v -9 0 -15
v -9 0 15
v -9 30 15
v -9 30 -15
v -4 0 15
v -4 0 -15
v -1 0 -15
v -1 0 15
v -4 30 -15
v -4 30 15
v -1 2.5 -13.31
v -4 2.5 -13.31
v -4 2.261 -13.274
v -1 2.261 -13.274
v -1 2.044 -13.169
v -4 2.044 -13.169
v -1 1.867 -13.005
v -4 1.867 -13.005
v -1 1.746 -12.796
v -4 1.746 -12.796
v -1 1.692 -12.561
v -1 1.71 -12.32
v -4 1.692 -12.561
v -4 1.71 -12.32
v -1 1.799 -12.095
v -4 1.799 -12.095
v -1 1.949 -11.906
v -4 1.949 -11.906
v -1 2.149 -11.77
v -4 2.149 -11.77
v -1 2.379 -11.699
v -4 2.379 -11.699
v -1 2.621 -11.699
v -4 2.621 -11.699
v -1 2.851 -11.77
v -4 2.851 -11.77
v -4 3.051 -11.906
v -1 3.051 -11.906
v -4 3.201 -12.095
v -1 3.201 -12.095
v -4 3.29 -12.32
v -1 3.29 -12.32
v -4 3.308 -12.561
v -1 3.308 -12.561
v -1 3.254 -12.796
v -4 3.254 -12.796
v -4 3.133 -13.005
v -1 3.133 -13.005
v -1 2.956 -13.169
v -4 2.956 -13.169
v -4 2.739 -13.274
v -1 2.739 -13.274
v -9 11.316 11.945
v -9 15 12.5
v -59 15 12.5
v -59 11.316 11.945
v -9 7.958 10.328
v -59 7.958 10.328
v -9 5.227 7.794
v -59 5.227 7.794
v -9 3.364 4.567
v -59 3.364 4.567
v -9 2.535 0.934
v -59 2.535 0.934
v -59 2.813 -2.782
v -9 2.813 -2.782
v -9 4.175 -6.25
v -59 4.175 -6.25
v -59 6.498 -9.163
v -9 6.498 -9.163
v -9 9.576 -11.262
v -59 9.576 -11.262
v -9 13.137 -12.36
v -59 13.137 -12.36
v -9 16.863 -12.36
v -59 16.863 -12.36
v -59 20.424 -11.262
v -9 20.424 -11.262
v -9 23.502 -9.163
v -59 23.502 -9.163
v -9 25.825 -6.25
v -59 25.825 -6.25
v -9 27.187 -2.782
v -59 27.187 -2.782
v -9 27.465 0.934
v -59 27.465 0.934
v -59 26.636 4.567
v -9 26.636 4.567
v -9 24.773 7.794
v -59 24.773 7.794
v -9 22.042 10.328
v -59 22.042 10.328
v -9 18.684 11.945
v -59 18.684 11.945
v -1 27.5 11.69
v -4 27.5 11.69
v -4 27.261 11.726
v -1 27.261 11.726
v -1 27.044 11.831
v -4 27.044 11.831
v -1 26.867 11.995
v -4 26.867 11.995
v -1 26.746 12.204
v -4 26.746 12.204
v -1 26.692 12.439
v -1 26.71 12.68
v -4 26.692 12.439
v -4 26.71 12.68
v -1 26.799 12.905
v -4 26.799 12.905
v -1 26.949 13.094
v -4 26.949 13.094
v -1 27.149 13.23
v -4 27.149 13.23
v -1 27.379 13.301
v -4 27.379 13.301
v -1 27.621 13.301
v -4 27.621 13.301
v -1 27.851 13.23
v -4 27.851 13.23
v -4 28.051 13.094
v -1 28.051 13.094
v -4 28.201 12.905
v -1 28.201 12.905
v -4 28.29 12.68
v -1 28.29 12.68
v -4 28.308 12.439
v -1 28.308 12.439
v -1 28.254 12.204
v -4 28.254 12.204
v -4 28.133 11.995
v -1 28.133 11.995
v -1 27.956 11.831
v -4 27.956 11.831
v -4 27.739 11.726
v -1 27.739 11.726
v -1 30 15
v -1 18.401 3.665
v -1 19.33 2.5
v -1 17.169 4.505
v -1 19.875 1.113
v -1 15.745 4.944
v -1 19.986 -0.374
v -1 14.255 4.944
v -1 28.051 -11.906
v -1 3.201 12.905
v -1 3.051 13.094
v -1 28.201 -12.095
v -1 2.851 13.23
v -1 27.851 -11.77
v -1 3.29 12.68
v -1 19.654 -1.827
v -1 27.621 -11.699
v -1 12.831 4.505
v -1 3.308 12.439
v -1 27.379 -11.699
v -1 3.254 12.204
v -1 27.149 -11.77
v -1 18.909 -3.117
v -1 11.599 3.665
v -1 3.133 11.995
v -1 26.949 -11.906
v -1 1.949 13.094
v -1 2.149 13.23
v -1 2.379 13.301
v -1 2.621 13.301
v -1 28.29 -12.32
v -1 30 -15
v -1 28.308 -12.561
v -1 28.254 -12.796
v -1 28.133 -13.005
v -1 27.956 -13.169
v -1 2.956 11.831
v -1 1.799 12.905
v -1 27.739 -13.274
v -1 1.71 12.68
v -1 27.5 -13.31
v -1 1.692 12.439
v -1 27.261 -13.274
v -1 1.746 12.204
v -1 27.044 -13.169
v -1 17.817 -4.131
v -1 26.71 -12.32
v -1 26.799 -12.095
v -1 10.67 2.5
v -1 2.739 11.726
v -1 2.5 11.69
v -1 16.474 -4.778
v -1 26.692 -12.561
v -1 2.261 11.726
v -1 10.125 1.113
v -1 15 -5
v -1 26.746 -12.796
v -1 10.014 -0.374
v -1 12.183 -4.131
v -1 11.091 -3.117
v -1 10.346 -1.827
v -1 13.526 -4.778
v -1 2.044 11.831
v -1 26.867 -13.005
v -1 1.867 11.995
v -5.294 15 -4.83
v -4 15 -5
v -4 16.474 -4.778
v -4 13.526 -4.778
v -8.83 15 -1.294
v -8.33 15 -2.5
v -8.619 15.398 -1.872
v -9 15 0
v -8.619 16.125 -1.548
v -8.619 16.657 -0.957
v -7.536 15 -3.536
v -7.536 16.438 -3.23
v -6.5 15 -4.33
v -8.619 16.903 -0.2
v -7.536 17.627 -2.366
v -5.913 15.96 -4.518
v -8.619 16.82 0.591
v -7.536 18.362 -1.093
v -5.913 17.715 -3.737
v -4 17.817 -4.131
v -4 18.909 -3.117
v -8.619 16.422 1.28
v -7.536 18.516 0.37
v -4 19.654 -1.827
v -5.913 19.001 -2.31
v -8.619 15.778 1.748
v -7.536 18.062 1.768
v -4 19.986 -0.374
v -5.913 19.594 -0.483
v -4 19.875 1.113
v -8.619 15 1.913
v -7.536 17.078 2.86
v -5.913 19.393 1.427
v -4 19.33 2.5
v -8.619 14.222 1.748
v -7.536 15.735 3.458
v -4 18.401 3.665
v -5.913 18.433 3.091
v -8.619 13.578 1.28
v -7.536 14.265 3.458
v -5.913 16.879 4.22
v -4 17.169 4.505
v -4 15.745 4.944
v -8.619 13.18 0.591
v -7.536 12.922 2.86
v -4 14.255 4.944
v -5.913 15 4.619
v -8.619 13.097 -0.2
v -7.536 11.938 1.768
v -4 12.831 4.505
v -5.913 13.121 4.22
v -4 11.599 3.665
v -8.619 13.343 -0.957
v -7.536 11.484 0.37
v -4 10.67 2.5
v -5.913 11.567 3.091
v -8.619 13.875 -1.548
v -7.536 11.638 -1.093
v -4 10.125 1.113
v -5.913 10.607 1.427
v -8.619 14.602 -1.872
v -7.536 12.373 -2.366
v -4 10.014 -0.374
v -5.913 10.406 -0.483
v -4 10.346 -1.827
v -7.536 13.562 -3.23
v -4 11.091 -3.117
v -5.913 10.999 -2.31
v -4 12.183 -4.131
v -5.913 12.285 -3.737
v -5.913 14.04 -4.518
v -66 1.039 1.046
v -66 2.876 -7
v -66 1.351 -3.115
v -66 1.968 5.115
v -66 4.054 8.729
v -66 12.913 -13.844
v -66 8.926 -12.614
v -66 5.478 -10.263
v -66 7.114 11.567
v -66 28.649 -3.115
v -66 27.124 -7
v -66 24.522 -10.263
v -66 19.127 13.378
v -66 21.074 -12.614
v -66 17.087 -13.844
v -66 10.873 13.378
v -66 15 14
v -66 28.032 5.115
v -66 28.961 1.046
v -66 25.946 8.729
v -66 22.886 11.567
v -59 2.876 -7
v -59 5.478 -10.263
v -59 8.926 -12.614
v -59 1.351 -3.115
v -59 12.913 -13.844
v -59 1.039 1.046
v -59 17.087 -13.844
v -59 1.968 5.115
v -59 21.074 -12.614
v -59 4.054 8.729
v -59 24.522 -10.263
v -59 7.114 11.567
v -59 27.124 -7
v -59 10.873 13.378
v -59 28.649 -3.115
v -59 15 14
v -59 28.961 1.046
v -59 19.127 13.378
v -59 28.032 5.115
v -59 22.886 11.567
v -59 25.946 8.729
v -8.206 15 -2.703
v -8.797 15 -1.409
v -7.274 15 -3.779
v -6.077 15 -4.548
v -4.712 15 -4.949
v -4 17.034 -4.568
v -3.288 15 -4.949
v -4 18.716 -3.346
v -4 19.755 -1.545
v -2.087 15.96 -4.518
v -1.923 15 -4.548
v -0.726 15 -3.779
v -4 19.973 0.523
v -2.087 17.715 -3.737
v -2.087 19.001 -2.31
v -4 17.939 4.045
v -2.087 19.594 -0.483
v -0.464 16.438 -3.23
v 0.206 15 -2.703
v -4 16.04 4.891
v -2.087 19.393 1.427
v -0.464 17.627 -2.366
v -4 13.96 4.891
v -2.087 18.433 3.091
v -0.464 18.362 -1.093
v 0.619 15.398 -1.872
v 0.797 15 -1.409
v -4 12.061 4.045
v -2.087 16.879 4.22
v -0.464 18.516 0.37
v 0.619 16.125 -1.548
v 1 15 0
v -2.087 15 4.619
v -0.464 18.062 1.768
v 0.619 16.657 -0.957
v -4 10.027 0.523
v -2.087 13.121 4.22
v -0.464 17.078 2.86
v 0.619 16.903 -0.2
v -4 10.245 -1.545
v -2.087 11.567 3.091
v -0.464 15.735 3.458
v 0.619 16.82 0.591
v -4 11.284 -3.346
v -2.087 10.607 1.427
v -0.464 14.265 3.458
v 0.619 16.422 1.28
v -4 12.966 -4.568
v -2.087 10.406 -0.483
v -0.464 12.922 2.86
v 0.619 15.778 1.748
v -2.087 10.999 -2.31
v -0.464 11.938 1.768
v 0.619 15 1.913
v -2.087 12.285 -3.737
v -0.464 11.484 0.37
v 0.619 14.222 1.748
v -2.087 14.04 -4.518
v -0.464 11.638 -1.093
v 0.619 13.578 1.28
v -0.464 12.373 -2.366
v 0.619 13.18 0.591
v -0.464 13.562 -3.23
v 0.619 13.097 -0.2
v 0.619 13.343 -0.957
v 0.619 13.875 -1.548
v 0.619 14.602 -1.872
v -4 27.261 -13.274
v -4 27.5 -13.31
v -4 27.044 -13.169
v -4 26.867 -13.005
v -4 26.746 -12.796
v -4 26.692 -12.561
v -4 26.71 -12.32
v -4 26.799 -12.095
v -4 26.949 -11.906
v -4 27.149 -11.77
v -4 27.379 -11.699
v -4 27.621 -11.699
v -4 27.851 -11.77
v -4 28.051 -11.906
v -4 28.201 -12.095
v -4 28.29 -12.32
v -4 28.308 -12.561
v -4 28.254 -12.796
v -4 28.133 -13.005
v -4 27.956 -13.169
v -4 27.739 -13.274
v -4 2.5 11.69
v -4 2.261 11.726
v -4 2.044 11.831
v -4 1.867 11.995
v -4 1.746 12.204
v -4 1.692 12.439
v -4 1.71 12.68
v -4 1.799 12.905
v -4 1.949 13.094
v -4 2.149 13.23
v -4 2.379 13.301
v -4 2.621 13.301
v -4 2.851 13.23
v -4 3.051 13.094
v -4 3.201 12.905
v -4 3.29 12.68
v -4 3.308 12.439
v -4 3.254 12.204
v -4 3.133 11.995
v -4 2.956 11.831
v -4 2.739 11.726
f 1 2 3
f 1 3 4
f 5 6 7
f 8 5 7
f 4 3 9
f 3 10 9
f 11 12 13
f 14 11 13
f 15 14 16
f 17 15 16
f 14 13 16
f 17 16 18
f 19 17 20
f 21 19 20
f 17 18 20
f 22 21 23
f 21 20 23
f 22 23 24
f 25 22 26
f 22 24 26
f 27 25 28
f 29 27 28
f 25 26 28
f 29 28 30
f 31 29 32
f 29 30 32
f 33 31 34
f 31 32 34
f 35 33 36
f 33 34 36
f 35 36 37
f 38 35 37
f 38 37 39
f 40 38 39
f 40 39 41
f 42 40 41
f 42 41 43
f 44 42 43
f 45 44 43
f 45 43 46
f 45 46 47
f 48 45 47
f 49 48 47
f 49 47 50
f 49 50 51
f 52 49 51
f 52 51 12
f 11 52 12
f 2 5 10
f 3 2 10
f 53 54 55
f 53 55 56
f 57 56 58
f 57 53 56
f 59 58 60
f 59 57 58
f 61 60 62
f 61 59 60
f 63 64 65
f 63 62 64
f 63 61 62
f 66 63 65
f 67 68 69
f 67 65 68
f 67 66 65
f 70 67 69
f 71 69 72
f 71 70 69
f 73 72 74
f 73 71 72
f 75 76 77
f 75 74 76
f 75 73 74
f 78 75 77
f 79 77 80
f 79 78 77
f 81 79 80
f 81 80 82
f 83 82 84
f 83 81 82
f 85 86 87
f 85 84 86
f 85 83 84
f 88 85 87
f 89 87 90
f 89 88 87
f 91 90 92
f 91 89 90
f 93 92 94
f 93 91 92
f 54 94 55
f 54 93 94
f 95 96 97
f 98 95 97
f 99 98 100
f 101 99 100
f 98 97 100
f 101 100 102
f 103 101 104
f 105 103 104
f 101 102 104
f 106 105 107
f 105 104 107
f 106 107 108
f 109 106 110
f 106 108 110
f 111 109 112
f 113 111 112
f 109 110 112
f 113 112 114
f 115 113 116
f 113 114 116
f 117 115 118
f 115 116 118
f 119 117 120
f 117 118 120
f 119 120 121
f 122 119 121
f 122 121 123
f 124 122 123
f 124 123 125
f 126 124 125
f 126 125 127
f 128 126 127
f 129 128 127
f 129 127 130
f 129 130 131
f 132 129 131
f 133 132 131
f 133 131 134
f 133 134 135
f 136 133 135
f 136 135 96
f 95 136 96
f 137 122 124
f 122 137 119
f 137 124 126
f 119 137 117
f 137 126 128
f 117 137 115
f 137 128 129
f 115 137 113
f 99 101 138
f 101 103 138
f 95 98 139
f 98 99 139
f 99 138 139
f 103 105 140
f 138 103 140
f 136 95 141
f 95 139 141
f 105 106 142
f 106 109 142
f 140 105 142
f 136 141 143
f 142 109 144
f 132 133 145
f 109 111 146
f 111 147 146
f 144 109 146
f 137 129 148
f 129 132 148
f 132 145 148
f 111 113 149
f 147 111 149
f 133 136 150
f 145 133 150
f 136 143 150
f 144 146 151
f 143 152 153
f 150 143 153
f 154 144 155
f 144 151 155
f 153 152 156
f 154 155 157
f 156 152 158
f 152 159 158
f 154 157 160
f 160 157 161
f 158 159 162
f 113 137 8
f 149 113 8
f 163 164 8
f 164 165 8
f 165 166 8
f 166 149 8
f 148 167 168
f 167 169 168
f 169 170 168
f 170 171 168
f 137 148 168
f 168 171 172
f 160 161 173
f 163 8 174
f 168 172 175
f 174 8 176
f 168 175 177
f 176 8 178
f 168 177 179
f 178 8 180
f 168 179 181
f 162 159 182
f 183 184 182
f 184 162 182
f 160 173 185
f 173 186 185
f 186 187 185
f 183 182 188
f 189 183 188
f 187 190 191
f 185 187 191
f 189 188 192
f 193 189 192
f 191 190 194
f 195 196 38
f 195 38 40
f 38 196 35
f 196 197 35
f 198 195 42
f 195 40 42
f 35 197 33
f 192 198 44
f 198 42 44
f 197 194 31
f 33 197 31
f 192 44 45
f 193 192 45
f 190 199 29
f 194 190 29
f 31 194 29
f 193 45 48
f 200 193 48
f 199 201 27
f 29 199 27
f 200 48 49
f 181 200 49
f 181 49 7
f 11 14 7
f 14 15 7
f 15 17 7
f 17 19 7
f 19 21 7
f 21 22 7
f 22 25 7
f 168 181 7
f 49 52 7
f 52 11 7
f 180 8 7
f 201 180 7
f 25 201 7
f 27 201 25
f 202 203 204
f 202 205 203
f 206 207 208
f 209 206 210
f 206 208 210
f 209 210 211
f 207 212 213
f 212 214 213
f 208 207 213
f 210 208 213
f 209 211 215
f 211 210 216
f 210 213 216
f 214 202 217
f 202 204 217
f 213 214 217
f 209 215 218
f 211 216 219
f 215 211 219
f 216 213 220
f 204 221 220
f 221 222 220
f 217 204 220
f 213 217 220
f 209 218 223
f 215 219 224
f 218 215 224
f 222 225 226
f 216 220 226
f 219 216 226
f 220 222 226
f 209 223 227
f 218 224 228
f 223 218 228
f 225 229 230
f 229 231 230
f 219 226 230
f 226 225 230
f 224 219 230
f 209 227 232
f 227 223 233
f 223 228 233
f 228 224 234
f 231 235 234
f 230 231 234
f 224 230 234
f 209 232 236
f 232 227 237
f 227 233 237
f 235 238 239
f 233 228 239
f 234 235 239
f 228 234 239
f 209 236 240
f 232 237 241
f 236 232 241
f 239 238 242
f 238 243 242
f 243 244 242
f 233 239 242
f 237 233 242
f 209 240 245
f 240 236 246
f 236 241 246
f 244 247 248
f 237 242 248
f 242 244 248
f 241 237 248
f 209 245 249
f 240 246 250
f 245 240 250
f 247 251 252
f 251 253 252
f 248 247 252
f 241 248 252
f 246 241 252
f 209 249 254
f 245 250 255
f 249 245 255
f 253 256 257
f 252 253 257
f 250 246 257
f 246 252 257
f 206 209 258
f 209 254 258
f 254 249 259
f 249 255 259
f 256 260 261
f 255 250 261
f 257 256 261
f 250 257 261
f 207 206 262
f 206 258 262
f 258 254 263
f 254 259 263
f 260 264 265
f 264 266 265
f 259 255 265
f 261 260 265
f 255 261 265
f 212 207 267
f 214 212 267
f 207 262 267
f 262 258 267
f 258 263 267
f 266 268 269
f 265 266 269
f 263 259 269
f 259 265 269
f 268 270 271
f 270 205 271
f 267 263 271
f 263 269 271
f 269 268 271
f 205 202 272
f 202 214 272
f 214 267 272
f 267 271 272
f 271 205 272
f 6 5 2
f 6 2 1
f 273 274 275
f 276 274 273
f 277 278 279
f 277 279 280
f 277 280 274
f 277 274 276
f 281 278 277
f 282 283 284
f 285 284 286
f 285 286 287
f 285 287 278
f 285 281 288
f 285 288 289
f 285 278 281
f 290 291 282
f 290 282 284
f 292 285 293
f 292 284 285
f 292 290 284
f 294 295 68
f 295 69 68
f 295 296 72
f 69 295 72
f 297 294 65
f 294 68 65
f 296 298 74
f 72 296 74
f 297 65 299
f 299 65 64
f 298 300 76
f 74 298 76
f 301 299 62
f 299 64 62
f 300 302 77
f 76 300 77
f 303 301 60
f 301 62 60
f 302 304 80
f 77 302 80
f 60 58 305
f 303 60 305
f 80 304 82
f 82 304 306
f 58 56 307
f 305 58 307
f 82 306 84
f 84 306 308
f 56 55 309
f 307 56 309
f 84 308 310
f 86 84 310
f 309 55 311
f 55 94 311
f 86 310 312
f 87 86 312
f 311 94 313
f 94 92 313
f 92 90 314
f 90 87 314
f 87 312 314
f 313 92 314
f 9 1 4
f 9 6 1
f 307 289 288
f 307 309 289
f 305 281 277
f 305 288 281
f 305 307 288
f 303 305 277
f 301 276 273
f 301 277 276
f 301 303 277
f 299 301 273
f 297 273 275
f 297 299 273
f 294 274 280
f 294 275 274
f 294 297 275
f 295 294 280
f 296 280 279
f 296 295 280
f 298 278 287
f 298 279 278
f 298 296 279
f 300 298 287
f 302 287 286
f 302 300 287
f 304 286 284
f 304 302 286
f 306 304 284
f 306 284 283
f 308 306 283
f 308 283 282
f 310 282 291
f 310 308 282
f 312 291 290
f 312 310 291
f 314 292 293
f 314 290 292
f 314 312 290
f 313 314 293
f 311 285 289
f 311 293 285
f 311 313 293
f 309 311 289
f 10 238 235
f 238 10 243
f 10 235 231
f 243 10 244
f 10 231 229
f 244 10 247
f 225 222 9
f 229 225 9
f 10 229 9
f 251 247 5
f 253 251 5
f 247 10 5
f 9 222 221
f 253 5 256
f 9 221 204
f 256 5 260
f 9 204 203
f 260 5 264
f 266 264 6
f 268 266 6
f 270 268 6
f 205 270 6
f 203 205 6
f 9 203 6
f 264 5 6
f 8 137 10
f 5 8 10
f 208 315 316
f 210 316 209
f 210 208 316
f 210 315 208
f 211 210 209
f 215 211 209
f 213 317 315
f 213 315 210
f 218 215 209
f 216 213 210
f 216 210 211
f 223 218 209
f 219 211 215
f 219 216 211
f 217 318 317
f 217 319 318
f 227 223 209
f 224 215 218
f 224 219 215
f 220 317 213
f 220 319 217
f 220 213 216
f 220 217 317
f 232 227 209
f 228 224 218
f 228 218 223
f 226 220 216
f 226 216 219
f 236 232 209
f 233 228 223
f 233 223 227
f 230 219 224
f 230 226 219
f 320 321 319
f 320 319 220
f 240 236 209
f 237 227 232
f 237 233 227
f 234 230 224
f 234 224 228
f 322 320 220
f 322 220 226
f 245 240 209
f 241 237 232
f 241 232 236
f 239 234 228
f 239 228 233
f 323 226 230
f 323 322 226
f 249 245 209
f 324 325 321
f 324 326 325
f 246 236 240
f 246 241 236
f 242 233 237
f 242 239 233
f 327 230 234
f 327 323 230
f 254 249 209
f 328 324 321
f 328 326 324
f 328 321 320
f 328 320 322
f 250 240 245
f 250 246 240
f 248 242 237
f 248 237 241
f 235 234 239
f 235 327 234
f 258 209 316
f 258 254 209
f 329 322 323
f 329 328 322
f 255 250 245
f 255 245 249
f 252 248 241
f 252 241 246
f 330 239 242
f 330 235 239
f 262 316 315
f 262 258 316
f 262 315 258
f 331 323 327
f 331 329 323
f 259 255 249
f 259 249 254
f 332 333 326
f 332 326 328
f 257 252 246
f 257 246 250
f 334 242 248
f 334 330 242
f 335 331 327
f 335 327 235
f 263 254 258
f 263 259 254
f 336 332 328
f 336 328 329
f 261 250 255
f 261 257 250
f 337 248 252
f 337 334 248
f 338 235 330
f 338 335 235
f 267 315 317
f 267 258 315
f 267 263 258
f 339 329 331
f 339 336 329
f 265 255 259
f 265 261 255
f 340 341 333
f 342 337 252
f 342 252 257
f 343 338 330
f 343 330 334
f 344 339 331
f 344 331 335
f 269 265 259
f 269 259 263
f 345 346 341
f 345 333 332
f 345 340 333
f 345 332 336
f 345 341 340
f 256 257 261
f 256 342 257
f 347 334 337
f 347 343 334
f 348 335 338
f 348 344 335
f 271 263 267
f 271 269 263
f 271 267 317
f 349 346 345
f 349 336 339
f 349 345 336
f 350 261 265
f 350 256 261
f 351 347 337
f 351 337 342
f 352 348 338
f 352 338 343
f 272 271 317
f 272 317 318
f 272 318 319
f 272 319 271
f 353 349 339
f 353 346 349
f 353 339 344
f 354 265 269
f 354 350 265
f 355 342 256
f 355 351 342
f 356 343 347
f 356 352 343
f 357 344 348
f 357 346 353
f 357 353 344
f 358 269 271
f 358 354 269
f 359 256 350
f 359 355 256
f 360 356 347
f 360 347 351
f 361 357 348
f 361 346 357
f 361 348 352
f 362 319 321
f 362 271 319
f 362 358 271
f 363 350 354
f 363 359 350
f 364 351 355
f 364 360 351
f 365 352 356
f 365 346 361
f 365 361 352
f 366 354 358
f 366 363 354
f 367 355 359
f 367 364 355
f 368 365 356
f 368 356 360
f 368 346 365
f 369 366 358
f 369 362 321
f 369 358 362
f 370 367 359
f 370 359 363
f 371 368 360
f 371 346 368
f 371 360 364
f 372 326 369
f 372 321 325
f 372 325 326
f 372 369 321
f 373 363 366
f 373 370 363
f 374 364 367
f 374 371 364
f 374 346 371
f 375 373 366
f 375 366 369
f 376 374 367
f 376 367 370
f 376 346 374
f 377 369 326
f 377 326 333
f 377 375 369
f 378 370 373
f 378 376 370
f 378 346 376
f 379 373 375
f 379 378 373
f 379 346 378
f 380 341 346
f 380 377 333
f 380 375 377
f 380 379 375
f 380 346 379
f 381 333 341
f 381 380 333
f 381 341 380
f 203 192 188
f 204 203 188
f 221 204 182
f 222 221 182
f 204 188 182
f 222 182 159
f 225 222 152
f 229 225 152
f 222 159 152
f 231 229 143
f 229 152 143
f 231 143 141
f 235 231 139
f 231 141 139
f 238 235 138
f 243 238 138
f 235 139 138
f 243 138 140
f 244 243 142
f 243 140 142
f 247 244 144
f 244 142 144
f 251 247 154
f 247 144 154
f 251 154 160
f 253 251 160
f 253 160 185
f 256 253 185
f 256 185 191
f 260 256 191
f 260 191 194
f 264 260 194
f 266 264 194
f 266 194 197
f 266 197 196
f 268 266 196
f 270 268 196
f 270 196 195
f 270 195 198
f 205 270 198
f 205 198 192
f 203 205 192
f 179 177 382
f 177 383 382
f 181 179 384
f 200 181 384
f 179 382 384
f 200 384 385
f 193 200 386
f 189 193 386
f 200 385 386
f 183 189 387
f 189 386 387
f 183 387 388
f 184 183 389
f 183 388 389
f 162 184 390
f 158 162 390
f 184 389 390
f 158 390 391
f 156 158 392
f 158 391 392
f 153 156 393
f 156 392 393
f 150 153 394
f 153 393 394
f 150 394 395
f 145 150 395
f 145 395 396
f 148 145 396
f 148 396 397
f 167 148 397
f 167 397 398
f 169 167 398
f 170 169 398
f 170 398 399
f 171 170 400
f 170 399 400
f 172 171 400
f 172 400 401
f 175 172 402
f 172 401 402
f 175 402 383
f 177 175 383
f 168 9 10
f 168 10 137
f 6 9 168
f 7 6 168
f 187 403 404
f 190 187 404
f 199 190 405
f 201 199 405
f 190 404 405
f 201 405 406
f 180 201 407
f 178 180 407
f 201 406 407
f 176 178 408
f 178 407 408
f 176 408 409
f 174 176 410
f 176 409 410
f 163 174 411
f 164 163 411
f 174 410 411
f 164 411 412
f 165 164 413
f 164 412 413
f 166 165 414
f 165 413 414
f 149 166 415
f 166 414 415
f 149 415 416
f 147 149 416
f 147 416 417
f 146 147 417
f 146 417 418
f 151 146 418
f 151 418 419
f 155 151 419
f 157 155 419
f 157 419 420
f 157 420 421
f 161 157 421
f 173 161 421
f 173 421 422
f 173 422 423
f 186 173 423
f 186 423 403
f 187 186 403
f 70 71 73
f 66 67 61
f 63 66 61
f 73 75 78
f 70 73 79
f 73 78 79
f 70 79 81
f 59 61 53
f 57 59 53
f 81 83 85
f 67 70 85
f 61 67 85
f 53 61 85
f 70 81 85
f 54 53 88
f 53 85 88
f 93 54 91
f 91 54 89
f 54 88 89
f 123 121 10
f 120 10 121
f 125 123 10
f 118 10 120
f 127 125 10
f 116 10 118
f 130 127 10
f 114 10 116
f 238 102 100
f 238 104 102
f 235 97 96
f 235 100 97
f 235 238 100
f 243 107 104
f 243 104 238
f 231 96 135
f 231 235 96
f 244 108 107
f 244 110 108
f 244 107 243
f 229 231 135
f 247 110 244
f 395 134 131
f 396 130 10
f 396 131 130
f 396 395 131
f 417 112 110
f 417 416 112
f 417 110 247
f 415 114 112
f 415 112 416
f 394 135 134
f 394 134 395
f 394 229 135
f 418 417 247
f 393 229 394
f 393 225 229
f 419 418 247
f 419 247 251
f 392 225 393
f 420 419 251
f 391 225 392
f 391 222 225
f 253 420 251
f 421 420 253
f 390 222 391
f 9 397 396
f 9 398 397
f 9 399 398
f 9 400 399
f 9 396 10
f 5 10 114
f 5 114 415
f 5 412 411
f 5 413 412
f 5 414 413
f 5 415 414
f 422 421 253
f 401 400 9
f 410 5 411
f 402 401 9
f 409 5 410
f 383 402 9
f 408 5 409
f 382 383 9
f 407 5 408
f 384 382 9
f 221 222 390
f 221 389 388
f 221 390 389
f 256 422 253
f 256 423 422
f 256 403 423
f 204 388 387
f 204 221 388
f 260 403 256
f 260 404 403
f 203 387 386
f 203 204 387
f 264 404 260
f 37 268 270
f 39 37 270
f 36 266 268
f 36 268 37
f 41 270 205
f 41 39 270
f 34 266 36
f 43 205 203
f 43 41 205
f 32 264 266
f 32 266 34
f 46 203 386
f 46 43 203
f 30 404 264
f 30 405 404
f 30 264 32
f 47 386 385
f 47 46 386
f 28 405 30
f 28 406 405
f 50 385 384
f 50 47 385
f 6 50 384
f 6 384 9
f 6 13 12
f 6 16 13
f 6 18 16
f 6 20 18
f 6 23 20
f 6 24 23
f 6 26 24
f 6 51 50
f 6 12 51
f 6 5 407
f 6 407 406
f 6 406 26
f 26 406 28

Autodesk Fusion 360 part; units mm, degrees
sketch "Sketch1" plane through (0, 0, 0) normal (0, 1, 0) x (1, 0, 0)
  line L0 (-1, -15) -> (-1, 15)
  line L1 (-1, -15) -> (-4, -15)
  line L2 (-4, -15) -> (-4, 15)
  line L3 (-4, 15) -> (-1, 15)
  dimension "d1" = 30
  dimension "d2" = 15
  dimension "d3" = 1
extrude "Extrude1" add sketch "Sketch1" along normal blind 30 makes body 1 in component "Component"
sketch "Sketch2" plane through (0, 0, 0) normal (1, 0, 0) x (0, 0, -1)
  line L0 (-15, 30) -> (15, 0) construction
  line L1 (15, 0) -> (-15, 0) construction
  line L2 (-15, 0) -> (15, 30) construction
  circle A0 centre (0, 15) radius 5
  dimension "d6" = 10
extrude "Extrude2" cut sketch "Sketch2" against normal blind 6 bodies 1 in component "Component"
extrude "Extrude1'" add 1 faces at (-4, 3.338, -0.1246) along direction (-1, 0, 0) blind 5 separate body on bodies 1 makes body 2 in component "Component'"
sketch "Sketch4" plane through (-9, 4.83, 8.5507) normal (-1, 0, 0) x (0, 0, 1)
  circle A0 centre (-8.5507, 10.17) radius 5
  line L0 (-23.5507, -4.83) -> (6.4493, -4.83)
  line L1 (6.4493, -4.83) -> (6.4493, 25.17)
  line L2 (6.4493, 25.17) -> (-23.5507, 25.17)
  line L3 (-23.5507, 25.17) -> (-23.5507, -4.83)
  circle A1 centre (-8.5507, 10.17) radius 5
extrude "Extrude2'" add sketch "Sketch4" against normal blind 5 contours A0 A1 bodies 2 in component "Component'"
sphere "SpherePrimitive1" cut diameter 10 placed x (0, 0, -1) y (0, 1, 0) z (1, 0, 0) at (-4, 15, 0) bodies 2 in component "Component'"
sphere "SpherePrimitive1'" add diameter 10 placed x (0, 0, -1) y (0, 1, 0) z (1, 0, 0) at (0, 12.467, -31.5642) separate body makes body 3 in component "Component''"
sketch "Sketch7" plane through (0, 30, 0) normal (0, 1, 0) x (-1, 0, 0)
  line L0 (4, 15) -> (4, -15)
  line L1 (4, -15) -> (9, -15)
  line L2 (9, -15) -> (9, 15)
  line L3 (9, 15) -> (4, 15)
  line L4 (4, 15) -> (9.3623, 10.5005)
  line L5 (9.3623, 10.5005) -> (9.3623, -10.5005)
  line L6 (9.3623, -10.5005) -> (4, -15)
  dimension "d28" = 7
  dimension "d29" = 130
  dimension "d30" = 130
sketch "Sketch9" plane through (-9, 0, 0) normal (-1, 0, 0) x (0, 0, 1)
  line L0 (-15, 0) -> (15, 0)
  line L1 (15, 0) -> (15, 30)
  line L2 (15, 30) -> (-15, 30)
  line L3 (-15, 30) -> (-15, 0)
  circle A0 centre (0, 15) radius 12.5
  dimension "d36" = 25
extrude "Extrude1''" add sketch "Sketch9" along normal blind 50 separate body contours A0 makes body 4 in component "Component'''"
sketch "Sketch10" plane through (-59, 0, 0) normal (-1, 0, 0) x (0, 0, 1)
  circle A0 centre (0, 15) radius 12.5
  circle A1 centre (0, 15) radius 14
  dimension "d39" = 28
extrude "Extrude2''" add sketch "Sketch10" along normal blind 7 contours A0 | A1 bodies 4 in component "Component'''"
sketch "Sketch11" plane through (-1, 0, 0) normal (1, 0, 0) x (0, 0, -1)
  circle A0 centre (0, 15) radius 5
  line L0 (-15, 0) -> (15, 0)
  line L1 (15, 0) -> (15, 30)
  line L2 (15, 30) -> (-15, 30)
  line L3 (-15, 30) -> (-15, 0)
hole "Hole1" at (-1, 27.5, 12.5) direction (-1, 0, 0) diameter 1.62 depth 5 tip angle 118 bodies 1 in component "Component"
hole "Hole2" at (-1, 27.5, -12.5) direction (-1, 0, 0) diameter 1.62 depth 5 tip angle 118 bodies 1 in component "Component"
hole "Hole3" at (-1, 2.5, 12.5) direction (-1, 0, 0) diameter 1.62 depth 5 tip angle 118 bodies 1 in component "Component"
hole "Hole4" at (-1, 2.5, -12.5) direction (-1, 0, 0) diameter 1.62 depth 5 tip angle 118 bodies 1 in component "Component"
component "Component" placed x (1, 0, 0) y (0, 1, 0) z (0, 0, 1) at (0, 0, 0)
component "Component'" placed x (1, 0, 0) y (0, 1, 0) z (0, 0, 1) at (0, 0, 0)
component "Component''" placed x (1, 0, 0) y (0, 1, 0) z (0, 0, 1) at (-4, 2.533, 31.5642)
component "Component'''" placed x (1, 0, 0) y (0, 1, 0) z (0, 0, 1) at (0, 0, 0)
